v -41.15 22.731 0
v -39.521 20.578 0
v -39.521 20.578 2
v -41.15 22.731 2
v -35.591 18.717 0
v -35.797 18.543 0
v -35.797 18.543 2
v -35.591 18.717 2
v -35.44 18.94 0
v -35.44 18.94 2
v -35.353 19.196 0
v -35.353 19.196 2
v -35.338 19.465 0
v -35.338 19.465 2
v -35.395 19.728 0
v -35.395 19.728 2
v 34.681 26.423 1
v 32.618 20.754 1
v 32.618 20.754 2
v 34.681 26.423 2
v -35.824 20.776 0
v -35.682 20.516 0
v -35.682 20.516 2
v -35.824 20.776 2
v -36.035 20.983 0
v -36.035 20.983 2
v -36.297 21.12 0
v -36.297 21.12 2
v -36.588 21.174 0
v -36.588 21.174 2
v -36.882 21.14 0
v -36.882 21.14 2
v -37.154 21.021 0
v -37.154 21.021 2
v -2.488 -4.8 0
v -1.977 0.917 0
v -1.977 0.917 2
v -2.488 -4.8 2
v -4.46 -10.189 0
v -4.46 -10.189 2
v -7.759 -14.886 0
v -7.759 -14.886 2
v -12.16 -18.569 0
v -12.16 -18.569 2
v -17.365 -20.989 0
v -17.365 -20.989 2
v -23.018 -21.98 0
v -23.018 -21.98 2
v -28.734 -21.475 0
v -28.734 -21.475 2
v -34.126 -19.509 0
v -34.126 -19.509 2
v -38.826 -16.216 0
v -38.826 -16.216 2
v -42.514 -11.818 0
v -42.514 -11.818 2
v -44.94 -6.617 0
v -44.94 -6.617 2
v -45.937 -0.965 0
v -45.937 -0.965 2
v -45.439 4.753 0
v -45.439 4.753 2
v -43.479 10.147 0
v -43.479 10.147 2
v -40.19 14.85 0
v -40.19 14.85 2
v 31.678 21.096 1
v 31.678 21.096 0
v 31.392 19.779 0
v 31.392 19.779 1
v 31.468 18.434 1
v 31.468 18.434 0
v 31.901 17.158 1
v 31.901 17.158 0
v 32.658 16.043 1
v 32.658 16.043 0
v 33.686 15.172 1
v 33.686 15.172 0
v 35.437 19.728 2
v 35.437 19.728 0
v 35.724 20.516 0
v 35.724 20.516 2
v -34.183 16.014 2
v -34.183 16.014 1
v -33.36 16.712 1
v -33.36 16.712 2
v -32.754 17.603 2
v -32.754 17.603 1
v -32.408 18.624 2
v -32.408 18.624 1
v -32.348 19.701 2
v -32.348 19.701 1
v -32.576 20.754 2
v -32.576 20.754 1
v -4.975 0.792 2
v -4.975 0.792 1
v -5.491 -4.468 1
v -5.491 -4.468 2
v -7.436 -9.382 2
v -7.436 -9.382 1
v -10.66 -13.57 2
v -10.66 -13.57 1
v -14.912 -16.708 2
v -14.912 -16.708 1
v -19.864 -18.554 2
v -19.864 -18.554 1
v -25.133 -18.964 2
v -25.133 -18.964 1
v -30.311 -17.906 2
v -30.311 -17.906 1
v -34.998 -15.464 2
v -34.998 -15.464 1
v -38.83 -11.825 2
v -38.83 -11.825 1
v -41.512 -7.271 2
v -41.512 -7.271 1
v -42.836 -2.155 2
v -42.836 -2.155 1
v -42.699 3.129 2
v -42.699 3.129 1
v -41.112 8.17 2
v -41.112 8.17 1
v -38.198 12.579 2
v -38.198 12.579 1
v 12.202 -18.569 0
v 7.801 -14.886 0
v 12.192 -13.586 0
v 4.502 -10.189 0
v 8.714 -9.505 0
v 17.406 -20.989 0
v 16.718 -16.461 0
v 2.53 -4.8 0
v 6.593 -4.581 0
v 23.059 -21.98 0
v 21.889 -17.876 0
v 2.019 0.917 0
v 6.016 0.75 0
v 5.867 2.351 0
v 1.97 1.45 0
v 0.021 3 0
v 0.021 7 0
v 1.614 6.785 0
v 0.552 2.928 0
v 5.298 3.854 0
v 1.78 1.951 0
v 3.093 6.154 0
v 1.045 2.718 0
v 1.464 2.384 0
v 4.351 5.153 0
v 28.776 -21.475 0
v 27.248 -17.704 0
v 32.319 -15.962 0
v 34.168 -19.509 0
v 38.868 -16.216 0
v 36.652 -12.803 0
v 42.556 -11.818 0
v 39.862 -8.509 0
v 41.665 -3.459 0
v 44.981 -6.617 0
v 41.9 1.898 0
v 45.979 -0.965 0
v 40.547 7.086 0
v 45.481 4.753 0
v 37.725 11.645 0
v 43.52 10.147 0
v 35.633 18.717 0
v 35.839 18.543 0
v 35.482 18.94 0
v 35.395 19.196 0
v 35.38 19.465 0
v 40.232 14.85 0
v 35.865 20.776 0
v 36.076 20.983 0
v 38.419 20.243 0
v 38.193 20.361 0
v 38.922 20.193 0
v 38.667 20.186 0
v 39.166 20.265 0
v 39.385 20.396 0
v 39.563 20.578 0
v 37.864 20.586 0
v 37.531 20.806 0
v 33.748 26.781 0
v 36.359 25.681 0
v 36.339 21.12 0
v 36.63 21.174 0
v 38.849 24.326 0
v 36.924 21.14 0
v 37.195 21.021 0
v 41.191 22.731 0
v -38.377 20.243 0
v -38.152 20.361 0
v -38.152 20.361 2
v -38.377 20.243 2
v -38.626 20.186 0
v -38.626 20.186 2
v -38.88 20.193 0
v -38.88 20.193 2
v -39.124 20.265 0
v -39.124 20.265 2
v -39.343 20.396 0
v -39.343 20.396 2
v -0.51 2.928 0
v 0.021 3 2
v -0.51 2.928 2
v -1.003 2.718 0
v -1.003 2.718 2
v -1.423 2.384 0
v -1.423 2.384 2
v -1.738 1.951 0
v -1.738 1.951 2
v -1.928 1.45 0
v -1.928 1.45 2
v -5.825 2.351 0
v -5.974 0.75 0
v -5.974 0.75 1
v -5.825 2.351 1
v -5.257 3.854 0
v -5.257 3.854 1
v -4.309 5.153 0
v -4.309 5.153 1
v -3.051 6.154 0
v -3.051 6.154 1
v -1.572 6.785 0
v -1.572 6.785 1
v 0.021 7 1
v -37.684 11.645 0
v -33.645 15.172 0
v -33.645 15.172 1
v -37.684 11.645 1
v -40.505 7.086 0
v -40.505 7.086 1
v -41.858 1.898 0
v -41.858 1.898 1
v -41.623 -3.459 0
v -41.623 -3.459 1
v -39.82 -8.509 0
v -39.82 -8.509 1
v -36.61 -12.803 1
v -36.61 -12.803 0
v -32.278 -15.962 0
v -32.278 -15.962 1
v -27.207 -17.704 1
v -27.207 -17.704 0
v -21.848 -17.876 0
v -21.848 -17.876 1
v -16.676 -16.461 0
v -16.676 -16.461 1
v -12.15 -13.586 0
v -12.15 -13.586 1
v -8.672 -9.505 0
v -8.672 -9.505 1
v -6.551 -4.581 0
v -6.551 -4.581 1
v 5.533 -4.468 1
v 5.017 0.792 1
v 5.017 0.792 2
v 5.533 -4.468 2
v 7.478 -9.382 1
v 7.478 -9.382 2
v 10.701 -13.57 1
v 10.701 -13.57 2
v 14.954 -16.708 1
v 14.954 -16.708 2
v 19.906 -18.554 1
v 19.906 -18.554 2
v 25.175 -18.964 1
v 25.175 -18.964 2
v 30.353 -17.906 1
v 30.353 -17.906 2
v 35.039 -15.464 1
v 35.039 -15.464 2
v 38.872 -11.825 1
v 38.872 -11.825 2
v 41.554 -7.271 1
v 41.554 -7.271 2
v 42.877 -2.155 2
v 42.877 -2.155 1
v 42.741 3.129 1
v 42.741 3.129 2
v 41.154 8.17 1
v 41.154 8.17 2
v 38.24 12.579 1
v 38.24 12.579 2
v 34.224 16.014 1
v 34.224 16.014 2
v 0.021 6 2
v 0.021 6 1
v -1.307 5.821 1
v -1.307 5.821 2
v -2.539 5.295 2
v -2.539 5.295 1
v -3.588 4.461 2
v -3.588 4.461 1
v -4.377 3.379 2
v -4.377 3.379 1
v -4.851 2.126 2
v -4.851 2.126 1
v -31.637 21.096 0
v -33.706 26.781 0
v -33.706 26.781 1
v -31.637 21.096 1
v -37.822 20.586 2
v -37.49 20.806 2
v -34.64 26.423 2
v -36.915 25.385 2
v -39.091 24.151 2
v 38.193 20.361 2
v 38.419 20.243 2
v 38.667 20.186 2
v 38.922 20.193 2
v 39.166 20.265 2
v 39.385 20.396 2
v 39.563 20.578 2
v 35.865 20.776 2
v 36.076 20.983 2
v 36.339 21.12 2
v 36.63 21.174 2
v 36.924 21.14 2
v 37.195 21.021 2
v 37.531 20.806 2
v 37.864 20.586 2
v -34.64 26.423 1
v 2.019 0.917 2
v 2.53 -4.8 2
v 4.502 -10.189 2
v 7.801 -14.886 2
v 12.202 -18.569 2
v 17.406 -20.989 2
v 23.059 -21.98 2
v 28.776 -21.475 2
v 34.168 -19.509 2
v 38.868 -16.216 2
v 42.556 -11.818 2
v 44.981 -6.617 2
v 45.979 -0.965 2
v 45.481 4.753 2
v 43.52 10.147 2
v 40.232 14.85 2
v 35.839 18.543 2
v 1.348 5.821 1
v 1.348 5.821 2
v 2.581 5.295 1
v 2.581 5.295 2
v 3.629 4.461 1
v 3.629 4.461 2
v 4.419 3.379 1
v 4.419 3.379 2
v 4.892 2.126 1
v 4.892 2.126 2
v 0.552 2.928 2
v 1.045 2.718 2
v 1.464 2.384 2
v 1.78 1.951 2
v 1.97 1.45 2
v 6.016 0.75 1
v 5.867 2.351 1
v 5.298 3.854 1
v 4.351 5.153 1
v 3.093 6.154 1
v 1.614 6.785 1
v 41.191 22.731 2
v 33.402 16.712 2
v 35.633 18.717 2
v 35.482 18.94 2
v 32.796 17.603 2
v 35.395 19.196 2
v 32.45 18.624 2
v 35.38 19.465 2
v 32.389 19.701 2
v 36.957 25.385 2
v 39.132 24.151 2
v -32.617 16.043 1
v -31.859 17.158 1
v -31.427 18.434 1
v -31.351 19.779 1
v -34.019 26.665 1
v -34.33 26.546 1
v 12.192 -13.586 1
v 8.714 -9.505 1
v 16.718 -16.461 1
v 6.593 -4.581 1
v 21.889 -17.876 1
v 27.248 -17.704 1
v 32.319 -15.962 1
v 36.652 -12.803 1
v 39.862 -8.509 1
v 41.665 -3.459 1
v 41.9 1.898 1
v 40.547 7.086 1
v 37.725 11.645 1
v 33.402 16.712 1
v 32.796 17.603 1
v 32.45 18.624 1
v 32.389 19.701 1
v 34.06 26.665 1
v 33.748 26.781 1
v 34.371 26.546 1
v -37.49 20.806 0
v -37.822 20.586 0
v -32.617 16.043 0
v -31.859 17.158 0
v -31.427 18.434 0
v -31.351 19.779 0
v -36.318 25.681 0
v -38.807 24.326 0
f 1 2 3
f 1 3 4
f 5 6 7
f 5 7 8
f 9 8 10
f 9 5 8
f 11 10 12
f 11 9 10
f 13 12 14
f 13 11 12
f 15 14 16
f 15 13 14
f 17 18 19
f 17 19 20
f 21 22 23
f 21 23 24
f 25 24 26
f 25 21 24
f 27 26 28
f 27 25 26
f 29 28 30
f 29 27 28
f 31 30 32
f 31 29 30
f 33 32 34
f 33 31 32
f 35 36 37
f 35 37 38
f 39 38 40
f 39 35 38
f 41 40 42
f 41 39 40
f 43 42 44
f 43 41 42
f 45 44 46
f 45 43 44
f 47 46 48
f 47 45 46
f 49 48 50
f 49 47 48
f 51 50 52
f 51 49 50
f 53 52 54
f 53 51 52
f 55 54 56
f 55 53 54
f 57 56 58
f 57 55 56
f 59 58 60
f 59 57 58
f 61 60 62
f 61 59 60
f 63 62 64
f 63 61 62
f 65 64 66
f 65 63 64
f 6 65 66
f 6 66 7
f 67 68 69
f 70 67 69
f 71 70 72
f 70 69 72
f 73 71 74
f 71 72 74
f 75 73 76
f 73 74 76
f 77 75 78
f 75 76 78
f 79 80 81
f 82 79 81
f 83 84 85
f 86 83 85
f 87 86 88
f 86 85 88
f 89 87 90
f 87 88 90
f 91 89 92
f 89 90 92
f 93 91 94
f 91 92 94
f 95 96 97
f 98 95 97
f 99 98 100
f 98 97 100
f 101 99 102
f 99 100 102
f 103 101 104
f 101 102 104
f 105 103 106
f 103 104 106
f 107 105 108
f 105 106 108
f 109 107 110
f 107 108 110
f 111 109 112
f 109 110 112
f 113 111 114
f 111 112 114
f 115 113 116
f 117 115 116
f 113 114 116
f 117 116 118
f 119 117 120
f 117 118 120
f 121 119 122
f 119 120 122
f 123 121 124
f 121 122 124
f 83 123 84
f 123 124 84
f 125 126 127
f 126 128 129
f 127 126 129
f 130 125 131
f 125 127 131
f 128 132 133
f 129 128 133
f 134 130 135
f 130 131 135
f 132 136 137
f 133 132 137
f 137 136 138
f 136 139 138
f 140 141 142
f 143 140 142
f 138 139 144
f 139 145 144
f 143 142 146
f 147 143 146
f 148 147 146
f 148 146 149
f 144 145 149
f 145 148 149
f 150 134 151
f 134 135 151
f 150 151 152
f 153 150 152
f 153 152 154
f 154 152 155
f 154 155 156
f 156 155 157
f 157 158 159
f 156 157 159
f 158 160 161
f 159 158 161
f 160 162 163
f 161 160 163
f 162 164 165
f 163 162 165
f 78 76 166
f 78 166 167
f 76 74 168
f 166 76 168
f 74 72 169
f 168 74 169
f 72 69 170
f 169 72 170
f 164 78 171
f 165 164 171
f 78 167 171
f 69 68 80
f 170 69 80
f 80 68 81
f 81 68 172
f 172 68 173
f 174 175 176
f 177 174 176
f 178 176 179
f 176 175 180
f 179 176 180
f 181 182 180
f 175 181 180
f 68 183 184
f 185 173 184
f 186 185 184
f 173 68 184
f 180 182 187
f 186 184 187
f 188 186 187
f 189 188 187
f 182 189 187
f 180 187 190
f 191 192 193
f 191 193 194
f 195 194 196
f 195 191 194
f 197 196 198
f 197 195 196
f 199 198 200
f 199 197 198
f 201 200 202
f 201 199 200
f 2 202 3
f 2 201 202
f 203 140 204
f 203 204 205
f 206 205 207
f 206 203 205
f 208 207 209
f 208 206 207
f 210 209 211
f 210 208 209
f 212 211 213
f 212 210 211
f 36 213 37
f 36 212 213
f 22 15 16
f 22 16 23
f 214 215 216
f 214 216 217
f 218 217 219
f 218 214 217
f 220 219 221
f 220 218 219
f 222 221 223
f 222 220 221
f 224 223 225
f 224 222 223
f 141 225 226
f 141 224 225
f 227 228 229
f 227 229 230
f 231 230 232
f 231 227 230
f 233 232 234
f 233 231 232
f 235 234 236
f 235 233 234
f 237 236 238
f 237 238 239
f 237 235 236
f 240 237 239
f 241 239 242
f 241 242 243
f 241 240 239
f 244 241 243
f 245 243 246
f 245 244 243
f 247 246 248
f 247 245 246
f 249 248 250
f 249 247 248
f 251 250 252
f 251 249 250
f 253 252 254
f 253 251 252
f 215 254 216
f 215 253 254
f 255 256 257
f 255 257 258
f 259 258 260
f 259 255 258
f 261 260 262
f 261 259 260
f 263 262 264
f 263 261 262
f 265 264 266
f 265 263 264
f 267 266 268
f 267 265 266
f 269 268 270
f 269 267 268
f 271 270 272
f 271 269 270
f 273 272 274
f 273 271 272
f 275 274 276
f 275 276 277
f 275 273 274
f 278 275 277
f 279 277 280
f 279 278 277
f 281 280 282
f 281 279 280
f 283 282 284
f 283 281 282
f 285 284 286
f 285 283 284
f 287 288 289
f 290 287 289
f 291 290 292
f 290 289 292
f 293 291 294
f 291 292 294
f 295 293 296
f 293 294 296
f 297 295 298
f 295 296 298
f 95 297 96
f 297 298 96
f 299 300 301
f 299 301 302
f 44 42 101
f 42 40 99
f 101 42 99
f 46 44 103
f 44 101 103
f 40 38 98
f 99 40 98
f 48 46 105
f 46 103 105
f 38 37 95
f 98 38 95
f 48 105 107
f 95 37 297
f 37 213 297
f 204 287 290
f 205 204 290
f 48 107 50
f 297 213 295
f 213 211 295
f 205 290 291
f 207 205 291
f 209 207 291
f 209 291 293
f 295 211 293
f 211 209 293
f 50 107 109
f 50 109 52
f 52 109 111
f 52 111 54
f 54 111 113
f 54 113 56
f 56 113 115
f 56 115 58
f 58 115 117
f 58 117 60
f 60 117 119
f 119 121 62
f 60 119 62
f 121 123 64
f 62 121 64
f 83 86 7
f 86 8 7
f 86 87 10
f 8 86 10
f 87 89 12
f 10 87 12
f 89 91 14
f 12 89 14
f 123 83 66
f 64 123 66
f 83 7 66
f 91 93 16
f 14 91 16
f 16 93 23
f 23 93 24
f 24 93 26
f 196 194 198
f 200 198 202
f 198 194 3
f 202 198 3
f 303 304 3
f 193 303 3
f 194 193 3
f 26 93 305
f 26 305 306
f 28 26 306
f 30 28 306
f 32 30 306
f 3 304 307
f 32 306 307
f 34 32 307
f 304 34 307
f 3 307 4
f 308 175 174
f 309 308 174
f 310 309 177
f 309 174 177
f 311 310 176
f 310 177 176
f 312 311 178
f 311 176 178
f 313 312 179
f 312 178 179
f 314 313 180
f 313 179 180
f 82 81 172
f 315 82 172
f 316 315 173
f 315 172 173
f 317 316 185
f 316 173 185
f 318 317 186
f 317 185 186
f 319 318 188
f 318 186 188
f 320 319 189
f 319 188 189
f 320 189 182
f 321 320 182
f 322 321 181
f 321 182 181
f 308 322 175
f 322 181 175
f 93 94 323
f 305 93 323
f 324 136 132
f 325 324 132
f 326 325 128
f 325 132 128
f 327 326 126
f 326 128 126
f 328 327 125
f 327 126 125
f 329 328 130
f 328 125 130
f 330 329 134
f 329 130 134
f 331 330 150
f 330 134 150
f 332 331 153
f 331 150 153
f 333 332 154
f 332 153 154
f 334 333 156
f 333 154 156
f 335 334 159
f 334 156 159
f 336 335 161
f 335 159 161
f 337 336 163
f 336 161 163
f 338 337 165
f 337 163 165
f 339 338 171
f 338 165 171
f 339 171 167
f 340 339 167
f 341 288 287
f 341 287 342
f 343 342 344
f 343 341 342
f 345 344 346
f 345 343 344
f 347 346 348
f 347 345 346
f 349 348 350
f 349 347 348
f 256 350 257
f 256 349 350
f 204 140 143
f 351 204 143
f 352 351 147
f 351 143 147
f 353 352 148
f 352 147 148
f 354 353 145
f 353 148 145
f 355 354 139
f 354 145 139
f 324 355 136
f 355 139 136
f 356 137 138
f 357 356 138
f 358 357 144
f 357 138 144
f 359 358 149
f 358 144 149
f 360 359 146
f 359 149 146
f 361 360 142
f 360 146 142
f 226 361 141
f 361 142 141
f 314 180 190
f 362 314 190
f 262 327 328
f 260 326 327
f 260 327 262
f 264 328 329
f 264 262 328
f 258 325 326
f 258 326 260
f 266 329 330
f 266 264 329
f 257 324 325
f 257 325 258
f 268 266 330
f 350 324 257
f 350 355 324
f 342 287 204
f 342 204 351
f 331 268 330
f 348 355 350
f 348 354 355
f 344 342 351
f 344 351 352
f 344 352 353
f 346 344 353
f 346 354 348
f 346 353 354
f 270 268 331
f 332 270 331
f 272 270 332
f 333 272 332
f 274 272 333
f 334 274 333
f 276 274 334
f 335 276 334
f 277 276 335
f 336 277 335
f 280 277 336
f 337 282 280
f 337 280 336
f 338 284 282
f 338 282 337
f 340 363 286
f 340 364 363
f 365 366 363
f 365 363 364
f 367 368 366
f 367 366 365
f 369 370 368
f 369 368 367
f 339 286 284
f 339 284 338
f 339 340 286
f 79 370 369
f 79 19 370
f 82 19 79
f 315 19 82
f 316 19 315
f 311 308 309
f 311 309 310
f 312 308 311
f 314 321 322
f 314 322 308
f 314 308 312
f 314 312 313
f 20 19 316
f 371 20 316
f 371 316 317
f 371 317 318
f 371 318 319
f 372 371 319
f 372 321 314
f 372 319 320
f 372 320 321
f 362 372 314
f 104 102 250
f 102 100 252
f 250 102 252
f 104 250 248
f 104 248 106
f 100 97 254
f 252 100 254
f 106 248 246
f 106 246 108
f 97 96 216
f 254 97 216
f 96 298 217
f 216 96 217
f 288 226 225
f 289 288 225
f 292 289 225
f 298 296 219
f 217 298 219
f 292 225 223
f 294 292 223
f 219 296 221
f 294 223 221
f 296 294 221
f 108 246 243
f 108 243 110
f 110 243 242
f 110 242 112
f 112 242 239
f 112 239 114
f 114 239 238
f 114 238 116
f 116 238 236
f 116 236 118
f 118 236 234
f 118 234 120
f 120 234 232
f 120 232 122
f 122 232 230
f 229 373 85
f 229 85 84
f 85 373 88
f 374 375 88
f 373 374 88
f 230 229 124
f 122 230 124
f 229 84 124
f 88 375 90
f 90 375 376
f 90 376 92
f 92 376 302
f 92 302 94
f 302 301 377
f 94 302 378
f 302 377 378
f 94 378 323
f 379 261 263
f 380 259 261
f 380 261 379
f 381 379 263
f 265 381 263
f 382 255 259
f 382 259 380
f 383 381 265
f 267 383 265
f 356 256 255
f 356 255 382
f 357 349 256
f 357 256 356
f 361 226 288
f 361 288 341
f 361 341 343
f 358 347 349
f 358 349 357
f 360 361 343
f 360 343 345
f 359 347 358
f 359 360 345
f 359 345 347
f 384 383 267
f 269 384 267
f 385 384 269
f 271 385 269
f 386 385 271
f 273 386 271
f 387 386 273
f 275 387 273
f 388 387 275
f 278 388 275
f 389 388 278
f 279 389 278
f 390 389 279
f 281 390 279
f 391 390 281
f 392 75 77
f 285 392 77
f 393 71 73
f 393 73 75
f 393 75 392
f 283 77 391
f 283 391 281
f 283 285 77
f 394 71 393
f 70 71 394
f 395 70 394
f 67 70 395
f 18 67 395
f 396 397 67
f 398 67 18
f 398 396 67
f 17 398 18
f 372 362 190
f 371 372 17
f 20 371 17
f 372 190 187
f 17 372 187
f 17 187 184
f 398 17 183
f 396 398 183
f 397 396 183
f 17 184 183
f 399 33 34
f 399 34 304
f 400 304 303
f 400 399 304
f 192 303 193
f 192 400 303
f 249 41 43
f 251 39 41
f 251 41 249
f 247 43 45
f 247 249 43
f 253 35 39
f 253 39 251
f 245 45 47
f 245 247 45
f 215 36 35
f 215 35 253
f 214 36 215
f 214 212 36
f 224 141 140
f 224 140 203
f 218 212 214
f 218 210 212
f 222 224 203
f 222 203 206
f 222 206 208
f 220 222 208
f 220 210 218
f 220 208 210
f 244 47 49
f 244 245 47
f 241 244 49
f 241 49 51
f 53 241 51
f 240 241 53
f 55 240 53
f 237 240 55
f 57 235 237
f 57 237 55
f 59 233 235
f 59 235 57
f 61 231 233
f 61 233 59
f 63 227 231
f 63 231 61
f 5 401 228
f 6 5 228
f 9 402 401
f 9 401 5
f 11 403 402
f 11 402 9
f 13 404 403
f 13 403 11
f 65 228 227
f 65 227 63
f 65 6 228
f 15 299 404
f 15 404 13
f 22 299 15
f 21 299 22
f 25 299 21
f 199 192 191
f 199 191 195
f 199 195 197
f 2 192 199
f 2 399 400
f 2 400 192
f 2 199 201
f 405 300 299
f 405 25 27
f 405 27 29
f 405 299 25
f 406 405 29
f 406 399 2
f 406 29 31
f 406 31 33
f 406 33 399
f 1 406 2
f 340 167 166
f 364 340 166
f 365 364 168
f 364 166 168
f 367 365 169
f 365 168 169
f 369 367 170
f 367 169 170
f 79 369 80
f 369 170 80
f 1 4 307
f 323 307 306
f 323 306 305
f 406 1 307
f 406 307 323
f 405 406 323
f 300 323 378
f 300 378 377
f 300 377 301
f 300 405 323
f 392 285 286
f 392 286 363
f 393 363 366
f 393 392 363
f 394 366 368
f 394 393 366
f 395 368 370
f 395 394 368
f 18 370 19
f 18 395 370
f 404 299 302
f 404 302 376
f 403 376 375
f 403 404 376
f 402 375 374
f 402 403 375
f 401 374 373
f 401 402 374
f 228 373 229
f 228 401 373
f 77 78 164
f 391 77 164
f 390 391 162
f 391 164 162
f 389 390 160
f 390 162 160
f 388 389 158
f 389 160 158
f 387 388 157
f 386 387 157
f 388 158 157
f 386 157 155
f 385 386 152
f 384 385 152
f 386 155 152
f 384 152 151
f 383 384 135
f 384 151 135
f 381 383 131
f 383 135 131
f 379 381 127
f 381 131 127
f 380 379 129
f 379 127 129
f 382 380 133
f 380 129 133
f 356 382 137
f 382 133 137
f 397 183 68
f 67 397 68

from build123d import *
from build123d.topology import SkipClean

# Parameters (mm, degrees)
BASE_EXTRUSION_DEPTH    = 2
ENL_V_START             = -1
ENL_V_MAT_EXTRU_1_DEPTH = 1


with BuildPart() as part:
    # Esquisse1 → Base-Extrusion (new body)
    with BuildSketch(Plane.XY):
        with BuildLine():
            Line((33.747574085, 26.781239692), (31.678333174, 21.096047015))
            ThreePointArc((31.678333174, 21.096047015), (31.641362763, 17.781057074), (33.686188392, 15.171610147))
            ThreePointArc((33.686188392, 15.171610147), (32.319294254, -15.962122137), (6.015631788, 0.75))
            ThreePointArc((6.015631788, 0.75), (4.350969402, 5.153311931), (0.020842383, 7))
            Line((0.020842383, 7), (0.020842383, 3))
            ThreePointArc((0.020842383, 3), (1.464218056, 2.38443731), (2.019105518, 0.916666667))
            ThreePointArc((2.019105518, 0.916666667), (34.168026311, -19.509260389), (35.838674701, 18.543079068))
            ThreePointArc((35.838674701, 18.543079068), (35.429709575, 19.064968454), (35.437103657, 19.727966442))
            Line((35.437103657, 19.727966442), (35.72395853, 20.516093727))
            ThreePointArc((35.72395853, 20.516093727), (36.339050842, 21.119924861), (37.195305146, 21.021035229))
            ThreePointArc((37.195305146, 21.021035229), (37.69827952, 20.696790529), (38.19329026, 20.360513539))
            ThreePointArc((38.19329026, 20.360513539), (38.921758709, 20.193200611), (39.562738511, 20.577654497))
            Line((39.562738511, 20.577654497), (41.19141405, 22.731152258))
            ThreePointArc((41.19141405, 22.731152258), (37.620869006, 25.034414863), (33.747574085, 26.781239692))
        make_face()
    extrude(amount=BASE_EXTRUSION_DEPTH)

    # Esquisse2 → Enlèv. mat.-Extru.1 (cut)
    with BuildSketch(Plane.XY.offset(2).offset(ENL_V_START)):
        with BuildLine():
            Line((33.747574085, 26.781239692), (31.678333174, 21.096047015))
            ThreePointArc((31.678333174, 21.096047015), (31.641362763, 17.781057074), (33.686188392, 15.171610147))
            ThreePointArc((33.686188392, 15.171610147), (32.319294254, -15.962122137), (6.015631788, 0.75))
            ThreePointArc((6.015631788, 0.75), (4.350969402, 5.153311931), (0.020842383, 7))
            Line((0.020842383, 7), (0.020842383, 6))
            ThreePointArc((0.020842383, 6), (3.629281566, 4.461093276), (5.01650022, 0.791666667))
            ThreePointArc((5.01650022, 0.791666667), (32.781477268, -16.8489067), (34.224309969, 16.014477377))
            ThreePointArc((34.224309969, 16.014477377), (32.588449466, 18.102034919), (32.618025795, 20.754026872))
            Line((32.618025795, 20.754026872), (34.681264504, 26.422728636))
            ThreePointArc((34.681264504, 26.422728636), (34.215992075, 26.606080244), (33.747574085, 26.781239692))
        make_face()
    extrude(amount=ENL_V_MAT_EXTRU_1_DEPTH, mode=Mode.SUBTRACT)

    # Bossage-Symétrie1: part across face


with BuildPart() as part_1:
    with SkipClean():  # the faces are left unmerged after this step: merging them gives an invalid solid
        add(part.part)
        add(part.part.mirror(Plane(origin=(0.020842383, 4.785714286, 0.928571429), x_dir=(0, 0, 1), z_dir=(-1, 0, 0))))


solid = part_1.part
